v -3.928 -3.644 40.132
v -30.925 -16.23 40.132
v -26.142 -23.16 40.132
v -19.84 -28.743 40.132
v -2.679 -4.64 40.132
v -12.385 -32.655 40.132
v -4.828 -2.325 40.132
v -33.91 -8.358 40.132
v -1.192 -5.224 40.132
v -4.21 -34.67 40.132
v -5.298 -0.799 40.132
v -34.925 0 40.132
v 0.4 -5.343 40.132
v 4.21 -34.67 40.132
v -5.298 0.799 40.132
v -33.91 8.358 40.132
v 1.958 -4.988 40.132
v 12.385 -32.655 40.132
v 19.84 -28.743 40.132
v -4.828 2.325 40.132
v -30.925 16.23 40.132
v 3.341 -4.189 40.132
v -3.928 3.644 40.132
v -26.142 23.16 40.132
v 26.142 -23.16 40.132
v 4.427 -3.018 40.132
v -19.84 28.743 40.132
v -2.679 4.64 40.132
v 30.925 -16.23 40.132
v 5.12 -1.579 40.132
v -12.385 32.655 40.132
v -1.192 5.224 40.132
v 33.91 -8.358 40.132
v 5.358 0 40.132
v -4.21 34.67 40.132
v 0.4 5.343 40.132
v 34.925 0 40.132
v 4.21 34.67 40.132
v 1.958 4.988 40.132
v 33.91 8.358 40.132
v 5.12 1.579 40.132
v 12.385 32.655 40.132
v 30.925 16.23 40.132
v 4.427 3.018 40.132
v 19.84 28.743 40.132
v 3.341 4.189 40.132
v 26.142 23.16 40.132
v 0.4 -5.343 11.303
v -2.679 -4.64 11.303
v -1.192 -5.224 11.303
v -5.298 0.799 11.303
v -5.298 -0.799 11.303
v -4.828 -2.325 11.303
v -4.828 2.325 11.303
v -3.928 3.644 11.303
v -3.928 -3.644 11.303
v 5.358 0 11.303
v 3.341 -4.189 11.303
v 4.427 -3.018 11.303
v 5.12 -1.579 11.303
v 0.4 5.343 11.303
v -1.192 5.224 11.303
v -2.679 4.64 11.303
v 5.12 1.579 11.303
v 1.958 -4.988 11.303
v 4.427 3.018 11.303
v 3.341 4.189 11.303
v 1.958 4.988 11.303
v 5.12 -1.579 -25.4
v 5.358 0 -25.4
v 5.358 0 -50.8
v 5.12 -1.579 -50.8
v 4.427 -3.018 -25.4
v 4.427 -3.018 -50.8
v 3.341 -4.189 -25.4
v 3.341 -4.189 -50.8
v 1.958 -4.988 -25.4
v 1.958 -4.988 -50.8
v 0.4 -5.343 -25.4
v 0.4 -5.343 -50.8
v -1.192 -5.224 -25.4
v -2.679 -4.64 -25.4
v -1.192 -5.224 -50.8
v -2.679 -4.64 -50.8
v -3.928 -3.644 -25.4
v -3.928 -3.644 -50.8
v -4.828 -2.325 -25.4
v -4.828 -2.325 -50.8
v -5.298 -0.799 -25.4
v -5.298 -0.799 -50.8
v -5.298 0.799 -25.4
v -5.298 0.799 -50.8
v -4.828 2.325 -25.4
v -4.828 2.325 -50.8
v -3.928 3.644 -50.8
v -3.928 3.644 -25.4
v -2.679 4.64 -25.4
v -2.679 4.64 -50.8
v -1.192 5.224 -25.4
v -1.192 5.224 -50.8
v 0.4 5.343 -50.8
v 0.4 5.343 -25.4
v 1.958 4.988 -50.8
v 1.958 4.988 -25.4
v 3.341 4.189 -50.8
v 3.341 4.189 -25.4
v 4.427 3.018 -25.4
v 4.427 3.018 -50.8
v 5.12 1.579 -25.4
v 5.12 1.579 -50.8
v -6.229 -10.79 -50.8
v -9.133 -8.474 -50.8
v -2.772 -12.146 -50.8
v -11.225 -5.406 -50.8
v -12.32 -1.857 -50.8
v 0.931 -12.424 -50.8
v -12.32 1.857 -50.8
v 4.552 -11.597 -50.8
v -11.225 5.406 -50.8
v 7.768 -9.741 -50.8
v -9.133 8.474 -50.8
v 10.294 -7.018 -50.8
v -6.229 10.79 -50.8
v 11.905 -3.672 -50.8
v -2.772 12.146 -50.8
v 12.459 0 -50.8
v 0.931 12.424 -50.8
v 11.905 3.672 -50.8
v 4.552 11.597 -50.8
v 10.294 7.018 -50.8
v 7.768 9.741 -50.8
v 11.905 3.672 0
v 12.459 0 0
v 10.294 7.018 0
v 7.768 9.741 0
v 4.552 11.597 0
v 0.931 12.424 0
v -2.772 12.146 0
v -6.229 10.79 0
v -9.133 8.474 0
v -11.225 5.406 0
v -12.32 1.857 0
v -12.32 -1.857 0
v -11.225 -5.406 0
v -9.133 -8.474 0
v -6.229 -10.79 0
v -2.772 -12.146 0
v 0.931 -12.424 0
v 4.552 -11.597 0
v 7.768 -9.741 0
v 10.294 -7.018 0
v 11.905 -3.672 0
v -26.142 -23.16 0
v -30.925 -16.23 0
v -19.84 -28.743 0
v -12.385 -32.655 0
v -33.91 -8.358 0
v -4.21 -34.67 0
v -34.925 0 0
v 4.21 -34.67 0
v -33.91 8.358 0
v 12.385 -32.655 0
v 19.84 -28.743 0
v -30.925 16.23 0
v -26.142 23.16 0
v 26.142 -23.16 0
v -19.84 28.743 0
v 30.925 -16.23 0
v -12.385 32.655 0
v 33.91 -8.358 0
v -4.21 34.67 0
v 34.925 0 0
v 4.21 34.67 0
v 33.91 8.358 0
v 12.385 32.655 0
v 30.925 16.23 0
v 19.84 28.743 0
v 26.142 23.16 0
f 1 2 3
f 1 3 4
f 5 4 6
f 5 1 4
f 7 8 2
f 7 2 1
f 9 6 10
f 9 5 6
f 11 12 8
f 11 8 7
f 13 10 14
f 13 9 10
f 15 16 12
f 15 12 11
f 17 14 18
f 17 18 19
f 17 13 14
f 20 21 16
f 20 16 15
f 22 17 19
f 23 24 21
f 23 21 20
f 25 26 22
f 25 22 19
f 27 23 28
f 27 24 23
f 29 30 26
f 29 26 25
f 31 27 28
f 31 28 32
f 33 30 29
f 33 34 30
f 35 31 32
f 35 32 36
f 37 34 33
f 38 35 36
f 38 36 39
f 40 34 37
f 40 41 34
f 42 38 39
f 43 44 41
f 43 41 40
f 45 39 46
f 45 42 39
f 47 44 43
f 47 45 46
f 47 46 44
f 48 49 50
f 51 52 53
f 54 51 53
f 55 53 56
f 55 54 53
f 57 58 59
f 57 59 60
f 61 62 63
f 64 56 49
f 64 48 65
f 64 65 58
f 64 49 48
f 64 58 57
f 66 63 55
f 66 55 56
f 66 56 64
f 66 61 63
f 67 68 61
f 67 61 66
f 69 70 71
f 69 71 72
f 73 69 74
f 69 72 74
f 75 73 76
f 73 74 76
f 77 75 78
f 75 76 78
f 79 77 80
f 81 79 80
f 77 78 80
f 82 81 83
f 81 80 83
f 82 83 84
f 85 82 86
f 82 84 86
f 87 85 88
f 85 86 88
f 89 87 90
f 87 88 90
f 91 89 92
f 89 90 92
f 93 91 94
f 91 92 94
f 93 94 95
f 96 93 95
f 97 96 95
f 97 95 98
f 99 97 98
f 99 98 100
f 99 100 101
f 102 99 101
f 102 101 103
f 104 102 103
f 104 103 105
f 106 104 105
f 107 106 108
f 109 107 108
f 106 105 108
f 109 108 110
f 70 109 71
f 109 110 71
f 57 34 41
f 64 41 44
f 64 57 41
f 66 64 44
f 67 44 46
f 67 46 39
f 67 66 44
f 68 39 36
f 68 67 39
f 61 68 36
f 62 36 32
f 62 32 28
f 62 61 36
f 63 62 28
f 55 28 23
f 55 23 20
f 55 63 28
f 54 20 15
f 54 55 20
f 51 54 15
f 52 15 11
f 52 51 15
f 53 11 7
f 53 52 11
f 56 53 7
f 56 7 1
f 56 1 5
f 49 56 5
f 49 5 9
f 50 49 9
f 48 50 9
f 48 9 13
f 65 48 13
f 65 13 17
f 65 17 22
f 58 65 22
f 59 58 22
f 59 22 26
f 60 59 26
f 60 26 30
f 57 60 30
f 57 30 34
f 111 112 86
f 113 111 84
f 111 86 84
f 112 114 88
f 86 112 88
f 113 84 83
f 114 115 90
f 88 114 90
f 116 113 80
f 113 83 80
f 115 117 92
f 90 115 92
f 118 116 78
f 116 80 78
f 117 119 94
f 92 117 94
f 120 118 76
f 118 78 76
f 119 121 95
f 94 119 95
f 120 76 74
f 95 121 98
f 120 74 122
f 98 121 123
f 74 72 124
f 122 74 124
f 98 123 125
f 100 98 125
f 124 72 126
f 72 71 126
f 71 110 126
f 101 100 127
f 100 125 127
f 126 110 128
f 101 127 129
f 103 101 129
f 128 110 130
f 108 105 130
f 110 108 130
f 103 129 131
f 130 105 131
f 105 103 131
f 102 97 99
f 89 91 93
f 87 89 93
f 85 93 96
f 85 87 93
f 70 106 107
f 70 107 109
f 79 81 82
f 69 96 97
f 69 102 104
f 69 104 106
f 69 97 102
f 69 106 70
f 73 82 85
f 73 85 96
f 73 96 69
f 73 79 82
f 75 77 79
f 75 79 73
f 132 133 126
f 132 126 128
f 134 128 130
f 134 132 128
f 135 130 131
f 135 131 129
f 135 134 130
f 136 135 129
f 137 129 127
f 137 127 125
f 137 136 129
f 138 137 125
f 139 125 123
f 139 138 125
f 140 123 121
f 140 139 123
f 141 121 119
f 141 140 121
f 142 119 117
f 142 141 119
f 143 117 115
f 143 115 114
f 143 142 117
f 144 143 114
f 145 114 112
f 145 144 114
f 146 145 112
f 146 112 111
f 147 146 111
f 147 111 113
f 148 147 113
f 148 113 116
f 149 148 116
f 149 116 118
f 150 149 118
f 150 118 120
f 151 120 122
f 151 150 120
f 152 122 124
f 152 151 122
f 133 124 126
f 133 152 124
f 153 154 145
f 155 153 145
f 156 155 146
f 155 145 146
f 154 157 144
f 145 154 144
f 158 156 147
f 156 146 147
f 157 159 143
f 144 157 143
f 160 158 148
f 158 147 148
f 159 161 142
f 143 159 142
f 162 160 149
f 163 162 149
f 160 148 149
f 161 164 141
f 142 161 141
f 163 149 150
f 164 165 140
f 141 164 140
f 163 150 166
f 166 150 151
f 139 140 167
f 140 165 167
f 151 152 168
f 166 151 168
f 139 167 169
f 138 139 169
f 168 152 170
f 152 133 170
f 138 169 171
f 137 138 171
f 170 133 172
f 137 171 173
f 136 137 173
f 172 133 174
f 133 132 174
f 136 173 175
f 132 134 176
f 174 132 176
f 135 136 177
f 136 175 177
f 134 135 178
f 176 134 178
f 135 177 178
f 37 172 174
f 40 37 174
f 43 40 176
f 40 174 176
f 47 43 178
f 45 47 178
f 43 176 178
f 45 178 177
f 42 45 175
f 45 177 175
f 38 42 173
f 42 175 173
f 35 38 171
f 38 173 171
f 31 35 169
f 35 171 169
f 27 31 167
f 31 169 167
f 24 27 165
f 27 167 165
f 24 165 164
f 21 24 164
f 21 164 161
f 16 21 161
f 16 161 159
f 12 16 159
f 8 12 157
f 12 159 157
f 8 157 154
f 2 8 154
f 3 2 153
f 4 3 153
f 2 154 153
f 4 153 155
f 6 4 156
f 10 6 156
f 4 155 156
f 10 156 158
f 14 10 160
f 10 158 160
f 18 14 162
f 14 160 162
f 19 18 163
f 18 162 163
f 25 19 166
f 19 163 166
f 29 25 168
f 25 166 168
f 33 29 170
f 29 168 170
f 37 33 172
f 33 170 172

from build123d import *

# Parameters (mm, degrees)
F0_R     = 34.925
F0_R_2   = 5.35813
F1_DEPTH = 40.132
F2_DEPTH = 9.525
F4_R     = 12.4587
F5_DEPTH = 50.8
F6_R     = 5.35813
F7_DEPTH = 25.4
F8_R     = 5.35813
F9_DEPTH = 11.303


with BuildPart() as f1:
    # F0 (on Top) → F1 (new body)
    with BuildSketch(Plane.XY):
        Circle(F0_R)
        Circle(F0_R_2, mode=Mode.SUBTRACT)
    extrude(amount=F1_DEPTH)

    # F0 (on Top) → F2 (join)
    with BuildSketch(Plane.XY):
        Circle(F0_R_2)
    extrude(amount=F2_DEPTH)

    # F4 (on face) → F5 (join)
    with BuildSketch(Plane.XY):
        Circle(F4_R)
    extrude(amount=-F5_DEPTH)

    # F6 (on face) → F7 (cut)
    with BuildSketch(Plane(origin=(0, 0, -50.8), x_dir=(1, 0, 0), z_dir=(0, 0, -1))):
        Circle(F6_R)
    extrude(amount=-F7_DEPTH, mode=Mode.SUBTRACT)

    # F8 (on Top) → F9 (join)
    with BuildSketch(Plane.XY):
        Circle(F8_R)
    extrude(amount=F9_DEPTH)


solid = f1.part
